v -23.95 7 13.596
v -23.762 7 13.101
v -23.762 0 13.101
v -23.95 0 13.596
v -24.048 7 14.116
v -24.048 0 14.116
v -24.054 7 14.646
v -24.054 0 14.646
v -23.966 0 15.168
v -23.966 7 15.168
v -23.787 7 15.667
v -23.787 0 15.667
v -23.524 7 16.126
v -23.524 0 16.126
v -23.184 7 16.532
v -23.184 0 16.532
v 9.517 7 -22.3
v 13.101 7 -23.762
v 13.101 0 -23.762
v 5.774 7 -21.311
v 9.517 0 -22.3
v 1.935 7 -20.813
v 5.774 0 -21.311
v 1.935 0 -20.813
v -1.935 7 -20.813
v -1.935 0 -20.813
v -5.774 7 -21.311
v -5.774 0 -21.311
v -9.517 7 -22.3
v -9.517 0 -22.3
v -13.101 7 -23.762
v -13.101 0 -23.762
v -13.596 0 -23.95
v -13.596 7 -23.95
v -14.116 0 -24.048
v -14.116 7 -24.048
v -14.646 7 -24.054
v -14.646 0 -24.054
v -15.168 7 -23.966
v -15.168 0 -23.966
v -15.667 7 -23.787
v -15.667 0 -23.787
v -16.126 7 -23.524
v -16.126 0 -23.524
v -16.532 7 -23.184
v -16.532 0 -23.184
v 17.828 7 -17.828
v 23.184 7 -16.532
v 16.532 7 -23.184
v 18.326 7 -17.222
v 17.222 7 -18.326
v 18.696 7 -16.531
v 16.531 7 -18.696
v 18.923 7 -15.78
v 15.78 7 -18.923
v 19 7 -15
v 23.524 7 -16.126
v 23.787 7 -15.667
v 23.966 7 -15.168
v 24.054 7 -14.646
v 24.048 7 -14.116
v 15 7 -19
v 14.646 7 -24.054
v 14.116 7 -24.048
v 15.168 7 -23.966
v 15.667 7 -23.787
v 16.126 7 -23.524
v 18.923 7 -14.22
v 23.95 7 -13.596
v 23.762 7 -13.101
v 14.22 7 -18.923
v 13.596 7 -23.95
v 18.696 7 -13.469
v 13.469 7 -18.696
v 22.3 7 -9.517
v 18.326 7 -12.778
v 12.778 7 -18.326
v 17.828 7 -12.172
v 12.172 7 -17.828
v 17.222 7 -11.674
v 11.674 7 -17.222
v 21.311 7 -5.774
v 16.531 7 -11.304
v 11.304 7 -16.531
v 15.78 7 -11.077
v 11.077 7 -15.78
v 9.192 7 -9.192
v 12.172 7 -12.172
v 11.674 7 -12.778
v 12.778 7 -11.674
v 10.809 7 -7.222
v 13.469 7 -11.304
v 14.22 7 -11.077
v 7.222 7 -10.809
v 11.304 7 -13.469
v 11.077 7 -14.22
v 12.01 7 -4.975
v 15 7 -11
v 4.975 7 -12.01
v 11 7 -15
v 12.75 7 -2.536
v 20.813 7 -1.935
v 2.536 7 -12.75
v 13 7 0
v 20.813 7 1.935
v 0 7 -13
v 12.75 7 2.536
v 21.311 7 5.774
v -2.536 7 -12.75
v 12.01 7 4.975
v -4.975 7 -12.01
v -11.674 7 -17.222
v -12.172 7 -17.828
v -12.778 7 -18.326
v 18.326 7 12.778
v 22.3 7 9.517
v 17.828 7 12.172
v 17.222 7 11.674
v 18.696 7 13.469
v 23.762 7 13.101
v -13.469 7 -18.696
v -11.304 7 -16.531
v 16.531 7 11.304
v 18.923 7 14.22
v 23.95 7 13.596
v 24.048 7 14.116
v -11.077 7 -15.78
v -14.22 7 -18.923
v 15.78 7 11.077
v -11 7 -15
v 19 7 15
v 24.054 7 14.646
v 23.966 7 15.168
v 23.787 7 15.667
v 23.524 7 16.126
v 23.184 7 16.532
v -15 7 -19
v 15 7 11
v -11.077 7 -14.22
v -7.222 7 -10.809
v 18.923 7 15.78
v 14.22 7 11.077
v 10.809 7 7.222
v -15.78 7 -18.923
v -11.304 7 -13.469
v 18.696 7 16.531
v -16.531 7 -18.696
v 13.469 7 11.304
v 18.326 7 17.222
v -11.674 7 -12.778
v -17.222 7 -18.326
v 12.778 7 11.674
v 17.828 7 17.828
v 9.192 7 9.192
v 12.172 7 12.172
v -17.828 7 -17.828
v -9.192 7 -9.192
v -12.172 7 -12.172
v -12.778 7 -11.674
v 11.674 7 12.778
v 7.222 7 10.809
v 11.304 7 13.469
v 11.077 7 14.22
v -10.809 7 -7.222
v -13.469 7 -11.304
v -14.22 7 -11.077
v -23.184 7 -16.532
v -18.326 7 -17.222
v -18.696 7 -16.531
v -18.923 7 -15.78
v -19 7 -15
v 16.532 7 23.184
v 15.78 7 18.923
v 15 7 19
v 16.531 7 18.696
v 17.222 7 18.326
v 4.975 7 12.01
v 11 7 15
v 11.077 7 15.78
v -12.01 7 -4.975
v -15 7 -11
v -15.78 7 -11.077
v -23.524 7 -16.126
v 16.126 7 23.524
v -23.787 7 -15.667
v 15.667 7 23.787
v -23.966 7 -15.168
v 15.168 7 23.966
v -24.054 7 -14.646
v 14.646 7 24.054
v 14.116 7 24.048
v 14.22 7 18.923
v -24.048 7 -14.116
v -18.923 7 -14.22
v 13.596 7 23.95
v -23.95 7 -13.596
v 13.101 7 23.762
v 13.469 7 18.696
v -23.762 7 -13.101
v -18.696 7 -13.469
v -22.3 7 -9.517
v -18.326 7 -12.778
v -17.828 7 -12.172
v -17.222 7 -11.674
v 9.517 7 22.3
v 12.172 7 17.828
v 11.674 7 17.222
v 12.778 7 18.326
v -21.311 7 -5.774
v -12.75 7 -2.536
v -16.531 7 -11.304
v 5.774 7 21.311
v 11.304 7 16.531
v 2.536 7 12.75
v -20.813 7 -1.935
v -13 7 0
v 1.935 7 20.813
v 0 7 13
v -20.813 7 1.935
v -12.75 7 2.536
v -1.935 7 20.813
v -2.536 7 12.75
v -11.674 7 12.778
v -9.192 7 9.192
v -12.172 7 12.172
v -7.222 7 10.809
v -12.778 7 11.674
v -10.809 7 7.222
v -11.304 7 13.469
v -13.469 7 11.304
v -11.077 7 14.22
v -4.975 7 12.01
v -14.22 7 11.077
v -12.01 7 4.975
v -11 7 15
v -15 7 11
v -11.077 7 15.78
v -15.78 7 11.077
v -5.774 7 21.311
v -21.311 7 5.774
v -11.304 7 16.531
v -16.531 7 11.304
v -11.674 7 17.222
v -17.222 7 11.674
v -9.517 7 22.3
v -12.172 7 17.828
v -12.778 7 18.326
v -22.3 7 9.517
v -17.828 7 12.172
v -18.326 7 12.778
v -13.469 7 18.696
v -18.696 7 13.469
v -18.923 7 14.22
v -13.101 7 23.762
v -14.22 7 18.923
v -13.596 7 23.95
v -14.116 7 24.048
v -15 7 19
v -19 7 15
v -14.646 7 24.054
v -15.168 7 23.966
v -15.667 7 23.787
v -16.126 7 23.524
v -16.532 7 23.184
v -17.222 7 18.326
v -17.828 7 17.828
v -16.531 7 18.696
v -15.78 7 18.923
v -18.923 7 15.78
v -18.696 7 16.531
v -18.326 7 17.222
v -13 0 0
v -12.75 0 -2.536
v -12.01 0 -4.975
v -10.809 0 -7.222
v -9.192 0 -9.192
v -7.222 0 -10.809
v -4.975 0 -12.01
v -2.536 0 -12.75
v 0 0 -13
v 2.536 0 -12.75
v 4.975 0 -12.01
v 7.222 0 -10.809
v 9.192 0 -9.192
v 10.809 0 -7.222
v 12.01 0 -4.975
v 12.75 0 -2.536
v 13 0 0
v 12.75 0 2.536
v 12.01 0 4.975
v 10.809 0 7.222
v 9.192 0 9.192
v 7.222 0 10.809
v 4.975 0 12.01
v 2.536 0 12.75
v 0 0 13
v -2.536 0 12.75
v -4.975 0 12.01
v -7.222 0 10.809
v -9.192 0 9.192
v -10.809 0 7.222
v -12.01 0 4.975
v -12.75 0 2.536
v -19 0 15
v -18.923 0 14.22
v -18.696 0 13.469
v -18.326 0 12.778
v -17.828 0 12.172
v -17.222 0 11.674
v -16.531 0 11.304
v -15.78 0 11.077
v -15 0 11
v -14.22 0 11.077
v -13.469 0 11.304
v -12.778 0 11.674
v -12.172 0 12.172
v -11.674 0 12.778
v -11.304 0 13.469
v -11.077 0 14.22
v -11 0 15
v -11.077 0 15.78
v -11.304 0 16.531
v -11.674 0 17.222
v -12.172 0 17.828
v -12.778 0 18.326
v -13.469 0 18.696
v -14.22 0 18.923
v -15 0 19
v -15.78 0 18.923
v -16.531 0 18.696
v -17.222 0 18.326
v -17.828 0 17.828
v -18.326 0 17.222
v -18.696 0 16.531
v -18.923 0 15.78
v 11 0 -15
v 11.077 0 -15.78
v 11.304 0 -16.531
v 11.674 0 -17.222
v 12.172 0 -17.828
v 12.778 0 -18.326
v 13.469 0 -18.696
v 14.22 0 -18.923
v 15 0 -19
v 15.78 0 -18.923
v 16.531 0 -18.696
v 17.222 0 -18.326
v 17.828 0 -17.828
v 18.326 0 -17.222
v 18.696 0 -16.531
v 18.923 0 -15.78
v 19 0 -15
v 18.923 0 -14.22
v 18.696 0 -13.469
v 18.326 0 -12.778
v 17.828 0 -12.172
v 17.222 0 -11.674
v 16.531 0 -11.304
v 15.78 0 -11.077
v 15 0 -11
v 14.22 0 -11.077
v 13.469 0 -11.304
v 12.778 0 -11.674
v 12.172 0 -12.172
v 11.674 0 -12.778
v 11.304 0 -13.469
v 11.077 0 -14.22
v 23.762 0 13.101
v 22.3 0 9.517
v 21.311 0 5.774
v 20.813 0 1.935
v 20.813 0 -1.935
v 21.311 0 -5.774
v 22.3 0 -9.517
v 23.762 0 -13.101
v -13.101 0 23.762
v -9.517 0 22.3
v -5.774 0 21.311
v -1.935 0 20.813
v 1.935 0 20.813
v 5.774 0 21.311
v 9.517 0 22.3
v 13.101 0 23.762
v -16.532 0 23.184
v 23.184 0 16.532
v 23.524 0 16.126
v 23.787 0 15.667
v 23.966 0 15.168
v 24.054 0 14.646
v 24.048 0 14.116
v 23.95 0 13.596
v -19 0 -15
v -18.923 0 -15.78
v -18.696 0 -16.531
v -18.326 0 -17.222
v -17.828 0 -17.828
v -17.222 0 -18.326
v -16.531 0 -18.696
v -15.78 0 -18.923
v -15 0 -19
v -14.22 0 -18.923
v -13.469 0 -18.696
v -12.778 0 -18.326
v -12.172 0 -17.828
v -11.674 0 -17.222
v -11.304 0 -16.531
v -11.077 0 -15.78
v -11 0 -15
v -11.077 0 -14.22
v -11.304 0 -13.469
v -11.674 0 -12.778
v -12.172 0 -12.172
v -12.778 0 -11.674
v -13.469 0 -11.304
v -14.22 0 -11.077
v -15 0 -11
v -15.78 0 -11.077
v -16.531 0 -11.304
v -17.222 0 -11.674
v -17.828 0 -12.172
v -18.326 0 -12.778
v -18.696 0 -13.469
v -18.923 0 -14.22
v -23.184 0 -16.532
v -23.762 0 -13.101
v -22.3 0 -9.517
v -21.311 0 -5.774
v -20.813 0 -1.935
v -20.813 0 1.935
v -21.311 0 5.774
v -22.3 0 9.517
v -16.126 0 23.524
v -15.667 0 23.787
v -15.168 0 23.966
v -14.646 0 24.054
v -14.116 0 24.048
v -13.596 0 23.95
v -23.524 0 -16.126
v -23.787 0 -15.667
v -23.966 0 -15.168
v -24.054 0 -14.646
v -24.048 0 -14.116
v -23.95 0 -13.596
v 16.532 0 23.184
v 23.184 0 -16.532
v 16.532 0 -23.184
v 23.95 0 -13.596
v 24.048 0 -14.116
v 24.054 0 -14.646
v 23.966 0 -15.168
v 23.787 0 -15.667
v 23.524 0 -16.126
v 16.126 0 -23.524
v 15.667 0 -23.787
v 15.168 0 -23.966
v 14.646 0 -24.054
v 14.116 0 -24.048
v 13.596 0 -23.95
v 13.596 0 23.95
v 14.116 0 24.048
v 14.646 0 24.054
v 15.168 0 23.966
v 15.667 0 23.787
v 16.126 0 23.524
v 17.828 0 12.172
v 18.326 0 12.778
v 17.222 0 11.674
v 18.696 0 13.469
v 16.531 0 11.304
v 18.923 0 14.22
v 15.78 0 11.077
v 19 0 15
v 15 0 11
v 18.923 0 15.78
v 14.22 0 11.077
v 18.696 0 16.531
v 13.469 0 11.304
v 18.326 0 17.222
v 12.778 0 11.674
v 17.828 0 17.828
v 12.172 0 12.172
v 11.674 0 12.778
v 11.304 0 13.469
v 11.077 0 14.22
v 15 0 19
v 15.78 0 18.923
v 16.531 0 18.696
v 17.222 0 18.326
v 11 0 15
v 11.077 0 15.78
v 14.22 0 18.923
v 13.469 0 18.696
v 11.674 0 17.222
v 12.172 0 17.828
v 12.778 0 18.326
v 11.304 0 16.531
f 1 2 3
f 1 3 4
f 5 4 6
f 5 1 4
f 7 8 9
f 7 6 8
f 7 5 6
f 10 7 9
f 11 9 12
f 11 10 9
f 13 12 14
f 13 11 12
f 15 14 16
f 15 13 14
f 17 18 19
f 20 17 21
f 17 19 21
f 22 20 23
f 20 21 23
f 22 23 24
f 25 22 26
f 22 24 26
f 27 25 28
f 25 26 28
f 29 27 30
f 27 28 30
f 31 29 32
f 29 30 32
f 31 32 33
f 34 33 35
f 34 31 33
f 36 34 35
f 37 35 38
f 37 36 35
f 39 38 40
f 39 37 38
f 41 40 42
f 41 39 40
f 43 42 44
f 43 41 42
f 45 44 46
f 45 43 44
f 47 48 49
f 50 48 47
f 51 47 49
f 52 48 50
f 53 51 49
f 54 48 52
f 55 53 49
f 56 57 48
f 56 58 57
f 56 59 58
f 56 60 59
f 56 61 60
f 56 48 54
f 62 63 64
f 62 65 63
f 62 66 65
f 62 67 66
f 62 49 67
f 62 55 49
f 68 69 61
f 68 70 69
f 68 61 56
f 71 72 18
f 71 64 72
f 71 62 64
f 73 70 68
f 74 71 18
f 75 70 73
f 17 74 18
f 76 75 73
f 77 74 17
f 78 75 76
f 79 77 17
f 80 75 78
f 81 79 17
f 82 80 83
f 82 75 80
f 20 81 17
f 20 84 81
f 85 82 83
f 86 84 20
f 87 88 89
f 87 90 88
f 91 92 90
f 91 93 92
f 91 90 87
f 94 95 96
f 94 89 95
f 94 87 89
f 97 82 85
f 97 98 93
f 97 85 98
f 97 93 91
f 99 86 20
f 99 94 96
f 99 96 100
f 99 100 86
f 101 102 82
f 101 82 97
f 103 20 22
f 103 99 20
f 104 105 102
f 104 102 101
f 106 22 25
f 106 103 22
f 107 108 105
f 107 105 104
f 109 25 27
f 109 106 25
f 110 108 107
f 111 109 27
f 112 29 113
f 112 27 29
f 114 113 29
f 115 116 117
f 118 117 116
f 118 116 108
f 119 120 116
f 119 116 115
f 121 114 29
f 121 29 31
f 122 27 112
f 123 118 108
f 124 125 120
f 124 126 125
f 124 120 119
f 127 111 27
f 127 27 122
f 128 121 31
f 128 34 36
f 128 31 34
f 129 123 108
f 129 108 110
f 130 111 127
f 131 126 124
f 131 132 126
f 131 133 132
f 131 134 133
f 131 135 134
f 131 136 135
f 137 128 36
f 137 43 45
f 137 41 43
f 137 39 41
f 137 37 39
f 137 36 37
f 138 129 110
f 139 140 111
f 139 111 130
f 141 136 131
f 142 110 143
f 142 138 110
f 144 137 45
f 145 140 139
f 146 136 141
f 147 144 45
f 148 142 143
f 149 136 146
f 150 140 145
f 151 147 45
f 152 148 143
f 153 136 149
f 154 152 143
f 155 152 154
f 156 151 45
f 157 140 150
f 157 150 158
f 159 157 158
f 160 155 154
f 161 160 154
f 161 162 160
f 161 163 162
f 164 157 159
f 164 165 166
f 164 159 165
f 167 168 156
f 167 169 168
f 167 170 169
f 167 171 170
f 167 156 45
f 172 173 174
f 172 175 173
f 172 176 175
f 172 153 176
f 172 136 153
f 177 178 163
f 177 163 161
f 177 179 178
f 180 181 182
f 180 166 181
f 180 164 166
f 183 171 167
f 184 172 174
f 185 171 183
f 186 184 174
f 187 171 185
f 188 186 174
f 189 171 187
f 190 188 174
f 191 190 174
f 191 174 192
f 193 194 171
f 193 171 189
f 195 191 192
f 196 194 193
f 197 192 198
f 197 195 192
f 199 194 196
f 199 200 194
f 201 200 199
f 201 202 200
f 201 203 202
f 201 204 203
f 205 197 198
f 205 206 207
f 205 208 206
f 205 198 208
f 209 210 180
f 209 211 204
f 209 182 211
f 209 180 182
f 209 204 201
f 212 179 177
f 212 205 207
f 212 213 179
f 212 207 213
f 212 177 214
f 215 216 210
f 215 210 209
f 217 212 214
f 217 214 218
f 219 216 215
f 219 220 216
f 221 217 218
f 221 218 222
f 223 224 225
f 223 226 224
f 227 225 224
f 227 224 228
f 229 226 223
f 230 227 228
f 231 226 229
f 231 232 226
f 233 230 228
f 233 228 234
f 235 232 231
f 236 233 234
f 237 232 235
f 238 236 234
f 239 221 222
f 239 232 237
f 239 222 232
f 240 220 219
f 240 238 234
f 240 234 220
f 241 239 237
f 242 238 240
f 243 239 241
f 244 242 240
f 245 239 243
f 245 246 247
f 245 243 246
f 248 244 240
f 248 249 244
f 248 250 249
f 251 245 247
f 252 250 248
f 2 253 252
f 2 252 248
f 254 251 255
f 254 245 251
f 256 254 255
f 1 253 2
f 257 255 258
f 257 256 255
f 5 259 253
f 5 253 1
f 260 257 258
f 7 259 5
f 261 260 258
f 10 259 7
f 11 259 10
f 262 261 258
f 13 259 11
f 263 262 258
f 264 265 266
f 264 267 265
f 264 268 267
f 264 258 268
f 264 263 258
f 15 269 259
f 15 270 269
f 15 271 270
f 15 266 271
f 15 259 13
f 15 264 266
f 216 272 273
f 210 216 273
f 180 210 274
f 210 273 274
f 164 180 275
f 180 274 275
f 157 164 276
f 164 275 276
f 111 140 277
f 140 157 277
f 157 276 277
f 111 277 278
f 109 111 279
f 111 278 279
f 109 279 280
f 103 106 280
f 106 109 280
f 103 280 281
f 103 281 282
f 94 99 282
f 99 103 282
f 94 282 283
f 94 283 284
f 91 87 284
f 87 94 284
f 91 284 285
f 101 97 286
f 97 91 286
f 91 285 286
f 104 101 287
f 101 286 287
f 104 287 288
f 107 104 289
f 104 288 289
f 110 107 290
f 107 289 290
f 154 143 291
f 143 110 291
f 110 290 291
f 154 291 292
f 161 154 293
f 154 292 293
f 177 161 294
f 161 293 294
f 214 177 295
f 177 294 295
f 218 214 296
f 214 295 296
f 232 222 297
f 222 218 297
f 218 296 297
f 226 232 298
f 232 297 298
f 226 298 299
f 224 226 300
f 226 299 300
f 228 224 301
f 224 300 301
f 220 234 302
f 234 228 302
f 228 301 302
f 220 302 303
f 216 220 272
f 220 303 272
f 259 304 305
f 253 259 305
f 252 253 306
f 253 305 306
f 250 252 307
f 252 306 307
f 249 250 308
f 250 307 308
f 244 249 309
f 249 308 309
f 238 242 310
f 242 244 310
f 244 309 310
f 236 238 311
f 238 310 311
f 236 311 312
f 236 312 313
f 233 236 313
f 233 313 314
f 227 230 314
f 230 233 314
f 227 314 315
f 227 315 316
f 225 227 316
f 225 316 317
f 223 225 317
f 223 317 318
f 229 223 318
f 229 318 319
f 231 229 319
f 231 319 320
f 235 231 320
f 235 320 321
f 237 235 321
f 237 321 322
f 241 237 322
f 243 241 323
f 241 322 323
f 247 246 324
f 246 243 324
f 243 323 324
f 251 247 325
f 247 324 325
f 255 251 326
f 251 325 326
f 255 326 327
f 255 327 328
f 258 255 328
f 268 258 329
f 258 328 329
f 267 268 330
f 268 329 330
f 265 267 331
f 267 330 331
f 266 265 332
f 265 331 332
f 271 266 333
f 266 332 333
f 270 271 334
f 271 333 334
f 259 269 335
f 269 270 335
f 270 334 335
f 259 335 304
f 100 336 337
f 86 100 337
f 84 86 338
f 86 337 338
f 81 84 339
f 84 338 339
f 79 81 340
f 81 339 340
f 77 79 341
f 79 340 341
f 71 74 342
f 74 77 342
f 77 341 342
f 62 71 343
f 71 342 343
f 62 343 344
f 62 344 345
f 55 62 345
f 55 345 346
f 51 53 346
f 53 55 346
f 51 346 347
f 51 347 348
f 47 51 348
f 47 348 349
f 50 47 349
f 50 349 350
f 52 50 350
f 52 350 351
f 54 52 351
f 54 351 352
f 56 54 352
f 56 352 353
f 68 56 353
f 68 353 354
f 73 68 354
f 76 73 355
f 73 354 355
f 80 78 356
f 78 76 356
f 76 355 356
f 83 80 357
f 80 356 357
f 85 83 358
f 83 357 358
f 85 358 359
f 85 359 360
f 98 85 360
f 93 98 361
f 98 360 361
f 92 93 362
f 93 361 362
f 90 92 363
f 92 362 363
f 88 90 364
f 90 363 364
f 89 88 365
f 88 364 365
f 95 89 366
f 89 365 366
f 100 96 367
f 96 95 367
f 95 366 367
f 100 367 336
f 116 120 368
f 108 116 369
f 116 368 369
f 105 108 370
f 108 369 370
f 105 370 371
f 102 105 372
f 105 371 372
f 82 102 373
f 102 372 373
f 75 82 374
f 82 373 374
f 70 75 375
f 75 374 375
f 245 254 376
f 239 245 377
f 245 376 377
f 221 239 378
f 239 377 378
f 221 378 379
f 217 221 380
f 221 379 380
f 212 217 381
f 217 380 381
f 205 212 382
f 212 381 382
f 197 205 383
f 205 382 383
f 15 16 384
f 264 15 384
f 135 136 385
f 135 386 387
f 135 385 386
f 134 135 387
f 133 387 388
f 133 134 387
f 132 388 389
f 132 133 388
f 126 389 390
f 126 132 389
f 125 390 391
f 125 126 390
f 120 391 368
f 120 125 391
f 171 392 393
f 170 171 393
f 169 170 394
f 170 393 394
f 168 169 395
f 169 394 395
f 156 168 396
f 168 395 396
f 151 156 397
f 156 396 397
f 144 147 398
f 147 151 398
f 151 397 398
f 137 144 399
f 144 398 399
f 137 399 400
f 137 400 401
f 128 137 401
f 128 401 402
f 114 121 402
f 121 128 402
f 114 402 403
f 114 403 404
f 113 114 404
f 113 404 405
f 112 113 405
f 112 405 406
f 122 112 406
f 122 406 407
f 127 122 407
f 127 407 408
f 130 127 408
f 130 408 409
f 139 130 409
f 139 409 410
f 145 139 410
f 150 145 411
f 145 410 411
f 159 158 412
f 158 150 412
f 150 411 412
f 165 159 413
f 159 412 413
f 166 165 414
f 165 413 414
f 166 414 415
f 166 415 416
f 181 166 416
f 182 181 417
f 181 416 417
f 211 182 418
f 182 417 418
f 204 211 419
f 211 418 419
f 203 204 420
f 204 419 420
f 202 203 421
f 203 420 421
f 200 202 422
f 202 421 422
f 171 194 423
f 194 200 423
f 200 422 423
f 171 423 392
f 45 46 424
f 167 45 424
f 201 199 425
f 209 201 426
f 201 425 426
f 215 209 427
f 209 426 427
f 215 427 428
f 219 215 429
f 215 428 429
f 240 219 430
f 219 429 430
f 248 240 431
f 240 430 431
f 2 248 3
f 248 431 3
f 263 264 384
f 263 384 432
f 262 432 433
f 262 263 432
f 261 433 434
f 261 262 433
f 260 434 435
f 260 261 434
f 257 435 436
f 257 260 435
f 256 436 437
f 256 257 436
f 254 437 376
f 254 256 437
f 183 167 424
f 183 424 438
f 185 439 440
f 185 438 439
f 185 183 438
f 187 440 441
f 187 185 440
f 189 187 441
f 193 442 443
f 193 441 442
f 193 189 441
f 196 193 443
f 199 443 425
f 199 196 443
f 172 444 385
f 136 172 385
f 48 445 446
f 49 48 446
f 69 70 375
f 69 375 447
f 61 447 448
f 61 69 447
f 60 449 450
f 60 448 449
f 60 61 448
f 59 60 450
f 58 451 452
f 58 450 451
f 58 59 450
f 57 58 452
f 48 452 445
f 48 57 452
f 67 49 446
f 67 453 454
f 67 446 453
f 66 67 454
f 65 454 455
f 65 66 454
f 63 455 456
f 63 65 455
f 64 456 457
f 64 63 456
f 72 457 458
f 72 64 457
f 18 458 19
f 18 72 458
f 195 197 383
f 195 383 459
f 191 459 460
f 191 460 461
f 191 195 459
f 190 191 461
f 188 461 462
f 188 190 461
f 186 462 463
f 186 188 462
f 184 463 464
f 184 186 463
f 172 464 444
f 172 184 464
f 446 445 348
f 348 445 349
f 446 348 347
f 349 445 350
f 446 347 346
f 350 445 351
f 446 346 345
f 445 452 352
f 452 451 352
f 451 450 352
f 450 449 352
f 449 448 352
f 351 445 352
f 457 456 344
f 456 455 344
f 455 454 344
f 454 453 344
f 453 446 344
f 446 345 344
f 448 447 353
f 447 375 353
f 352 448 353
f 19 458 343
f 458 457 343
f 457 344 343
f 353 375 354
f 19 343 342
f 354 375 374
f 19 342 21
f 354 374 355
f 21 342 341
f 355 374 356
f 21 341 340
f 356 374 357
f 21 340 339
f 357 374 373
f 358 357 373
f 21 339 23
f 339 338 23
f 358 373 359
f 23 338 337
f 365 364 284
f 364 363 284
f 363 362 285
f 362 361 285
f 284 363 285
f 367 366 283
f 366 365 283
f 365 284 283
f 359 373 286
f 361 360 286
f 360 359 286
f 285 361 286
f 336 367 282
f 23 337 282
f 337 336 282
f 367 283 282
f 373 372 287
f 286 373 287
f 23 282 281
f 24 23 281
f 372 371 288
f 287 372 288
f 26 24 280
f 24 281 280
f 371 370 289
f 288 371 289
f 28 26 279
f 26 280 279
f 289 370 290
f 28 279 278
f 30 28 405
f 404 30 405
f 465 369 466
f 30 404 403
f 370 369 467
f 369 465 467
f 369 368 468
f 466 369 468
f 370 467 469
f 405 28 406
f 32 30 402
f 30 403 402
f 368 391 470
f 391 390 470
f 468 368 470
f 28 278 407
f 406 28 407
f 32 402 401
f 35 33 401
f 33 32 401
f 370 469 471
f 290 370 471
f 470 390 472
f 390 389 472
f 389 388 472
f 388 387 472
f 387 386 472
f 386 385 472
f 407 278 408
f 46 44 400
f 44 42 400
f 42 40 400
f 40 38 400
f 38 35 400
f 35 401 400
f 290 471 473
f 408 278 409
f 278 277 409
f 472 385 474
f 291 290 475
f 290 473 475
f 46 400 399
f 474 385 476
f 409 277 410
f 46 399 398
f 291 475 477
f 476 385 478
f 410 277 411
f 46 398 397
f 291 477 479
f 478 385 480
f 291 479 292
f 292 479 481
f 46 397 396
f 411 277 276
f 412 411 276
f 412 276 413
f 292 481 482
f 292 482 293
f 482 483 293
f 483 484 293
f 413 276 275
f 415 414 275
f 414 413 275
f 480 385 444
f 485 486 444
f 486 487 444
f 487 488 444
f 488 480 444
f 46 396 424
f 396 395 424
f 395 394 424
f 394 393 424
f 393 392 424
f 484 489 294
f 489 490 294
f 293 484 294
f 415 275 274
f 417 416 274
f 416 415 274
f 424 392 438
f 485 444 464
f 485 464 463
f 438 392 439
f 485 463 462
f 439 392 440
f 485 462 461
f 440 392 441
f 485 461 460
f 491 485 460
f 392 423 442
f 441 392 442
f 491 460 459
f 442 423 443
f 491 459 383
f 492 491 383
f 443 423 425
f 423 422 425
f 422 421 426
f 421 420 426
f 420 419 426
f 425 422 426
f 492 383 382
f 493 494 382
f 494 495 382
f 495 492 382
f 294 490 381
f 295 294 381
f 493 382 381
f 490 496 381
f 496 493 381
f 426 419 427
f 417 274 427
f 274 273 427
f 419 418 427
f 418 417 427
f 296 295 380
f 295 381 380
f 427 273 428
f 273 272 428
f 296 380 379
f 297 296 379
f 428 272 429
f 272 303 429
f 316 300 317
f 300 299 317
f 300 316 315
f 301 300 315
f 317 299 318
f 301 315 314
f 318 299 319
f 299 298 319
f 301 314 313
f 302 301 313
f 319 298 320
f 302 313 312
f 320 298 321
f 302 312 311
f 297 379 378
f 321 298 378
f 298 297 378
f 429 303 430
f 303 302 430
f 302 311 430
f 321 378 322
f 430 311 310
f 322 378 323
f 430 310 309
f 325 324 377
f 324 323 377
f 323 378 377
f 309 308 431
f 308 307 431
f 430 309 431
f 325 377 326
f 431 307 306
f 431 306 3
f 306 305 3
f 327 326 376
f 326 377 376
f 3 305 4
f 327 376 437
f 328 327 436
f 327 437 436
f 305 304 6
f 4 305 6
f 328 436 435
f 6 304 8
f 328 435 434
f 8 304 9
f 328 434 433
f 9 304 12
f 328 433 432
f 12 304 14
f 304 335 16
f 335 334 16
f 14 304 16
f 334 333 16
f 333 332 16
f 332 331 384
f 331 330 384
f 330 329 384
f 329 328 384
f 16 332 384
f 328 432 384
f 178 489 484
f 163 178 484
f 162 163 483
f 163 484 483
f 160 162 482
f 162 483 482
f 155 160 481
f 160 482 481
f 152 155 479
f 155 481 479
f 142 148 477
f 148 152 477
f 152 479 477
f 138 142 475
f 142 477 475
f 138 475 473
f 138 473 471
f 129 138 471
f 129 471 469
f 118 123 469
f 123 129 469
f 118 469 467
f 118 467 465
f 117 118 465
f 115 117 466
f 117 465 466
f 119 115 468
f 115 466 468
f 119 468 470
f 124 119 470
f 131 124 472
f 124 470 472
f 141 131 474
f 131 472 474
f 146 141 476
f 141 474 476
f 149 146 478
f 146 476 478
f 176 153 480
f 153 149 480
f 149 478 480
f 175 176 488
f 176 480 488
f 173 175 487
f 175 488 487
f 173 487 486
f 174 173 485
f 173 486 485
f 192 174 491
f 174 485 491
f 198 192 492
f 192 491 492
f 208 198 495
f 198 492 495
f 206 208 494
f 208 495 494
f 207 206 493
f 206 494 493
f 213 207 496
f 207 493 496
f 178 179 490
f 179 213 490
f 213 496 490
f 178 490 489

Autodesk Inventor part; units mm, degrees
ref_plane "YZ Plane" through (0, 0, 0) normal (1, 0, 0) x (0, 1, 0)
ref_plane "XZ Plane" through (0, 0, 0) normal (0, 1, 0) x (-1, 0, 0)
ref_plane "XY Plane" through (0, 0, 0) normal (0, 0, 1) x (1, 0, 0)
sketch "Sketch1" plane through (0, 0, 0) normal (0, 1, 0) x (-1, 0, 0)
  circle A0 centre (0, 0) radius 13
  line L0 (-14.9666, 24.75) -> (-24.75, 14.9666)
  line L1 (-24.75, 14.9666) -> (-24.75, -14.9666) construction
  line L2 (-24.75, -14.9666) -> (-14.9666, -24.75)
  line L3 (-14.9666, -24.75) -> (14.9666, -24.75) construction
  line L4 (14.9666, -24.75) -> (24.75, -14.9666)
  line L5 (24.75, -14.9666) -> (24.75, 14.9666) construction
  line L6 (24.75, 14.9666) -> (14.9666, 24.75)
  line L7 (14.9666, 24.75) -> (-14.9666, 24.75) construction
  arc A1 (-24.75, -14.9666) -> (-24.75, 14.9666) centre (-50.75, 0) ccw
  arc A2 (-14.9666, 24.75) -> (14.9666, 24.75) centre (0, 50.75) ccw
  arc A3 (24.75, 14.9666) -> (24.75, -14.9666) centre (50.75, 0) ccw
  arc A4 (14.9666, -24.75) -> (-14.9666, -24.75) centre (0, -50.75) ccw
  circle A5 centre (-15, 15) radius 4
  circle A6 centre (15, 15) radius 4
  circle A7 centre (15, -15) radius 4
  circle A8 centre (-15, -15) radius 4
  point P0 (-24.75, 0)
  point P1 (24.75, 0)
  point P2 (0, 24.75)
  point P3 (0, -24.75)
  point P4 (0, 20.75)
  dimension "d0" = 26
  dimension "d1" = 49.5
  dimension "d2" = 30
  dimension "d3" = 4
  dimension "d4" = 30
  dimension "d5" = 30
  dimension "d6" = 15
  dimension "d7" = 15
  dimension "d8" = 8
extrude "Extrusion1" add sketch "Sketch1" along normal blind 7
fillet "Fillet1" radius 3 8 edges at (24.75, 3.5, 14.9666) (14.9666, 3.5, 24.75) (-14.9666, 3.5, 24.75) (-24.75, 3.5, 14.9666) (-24.75, 3.5, -14.9666) (-14.9666, 3.5, -24.75) (14.9666, 3.5, -24.75) (24.75, 3.5, -14.9666)
equation "\"d5\" = d4"
equation "\"d6\" = 0.5 * d5"
equation "\"d7\" = d6"
properties part number "WobbleX WS12" material "Aluminum 6061"
